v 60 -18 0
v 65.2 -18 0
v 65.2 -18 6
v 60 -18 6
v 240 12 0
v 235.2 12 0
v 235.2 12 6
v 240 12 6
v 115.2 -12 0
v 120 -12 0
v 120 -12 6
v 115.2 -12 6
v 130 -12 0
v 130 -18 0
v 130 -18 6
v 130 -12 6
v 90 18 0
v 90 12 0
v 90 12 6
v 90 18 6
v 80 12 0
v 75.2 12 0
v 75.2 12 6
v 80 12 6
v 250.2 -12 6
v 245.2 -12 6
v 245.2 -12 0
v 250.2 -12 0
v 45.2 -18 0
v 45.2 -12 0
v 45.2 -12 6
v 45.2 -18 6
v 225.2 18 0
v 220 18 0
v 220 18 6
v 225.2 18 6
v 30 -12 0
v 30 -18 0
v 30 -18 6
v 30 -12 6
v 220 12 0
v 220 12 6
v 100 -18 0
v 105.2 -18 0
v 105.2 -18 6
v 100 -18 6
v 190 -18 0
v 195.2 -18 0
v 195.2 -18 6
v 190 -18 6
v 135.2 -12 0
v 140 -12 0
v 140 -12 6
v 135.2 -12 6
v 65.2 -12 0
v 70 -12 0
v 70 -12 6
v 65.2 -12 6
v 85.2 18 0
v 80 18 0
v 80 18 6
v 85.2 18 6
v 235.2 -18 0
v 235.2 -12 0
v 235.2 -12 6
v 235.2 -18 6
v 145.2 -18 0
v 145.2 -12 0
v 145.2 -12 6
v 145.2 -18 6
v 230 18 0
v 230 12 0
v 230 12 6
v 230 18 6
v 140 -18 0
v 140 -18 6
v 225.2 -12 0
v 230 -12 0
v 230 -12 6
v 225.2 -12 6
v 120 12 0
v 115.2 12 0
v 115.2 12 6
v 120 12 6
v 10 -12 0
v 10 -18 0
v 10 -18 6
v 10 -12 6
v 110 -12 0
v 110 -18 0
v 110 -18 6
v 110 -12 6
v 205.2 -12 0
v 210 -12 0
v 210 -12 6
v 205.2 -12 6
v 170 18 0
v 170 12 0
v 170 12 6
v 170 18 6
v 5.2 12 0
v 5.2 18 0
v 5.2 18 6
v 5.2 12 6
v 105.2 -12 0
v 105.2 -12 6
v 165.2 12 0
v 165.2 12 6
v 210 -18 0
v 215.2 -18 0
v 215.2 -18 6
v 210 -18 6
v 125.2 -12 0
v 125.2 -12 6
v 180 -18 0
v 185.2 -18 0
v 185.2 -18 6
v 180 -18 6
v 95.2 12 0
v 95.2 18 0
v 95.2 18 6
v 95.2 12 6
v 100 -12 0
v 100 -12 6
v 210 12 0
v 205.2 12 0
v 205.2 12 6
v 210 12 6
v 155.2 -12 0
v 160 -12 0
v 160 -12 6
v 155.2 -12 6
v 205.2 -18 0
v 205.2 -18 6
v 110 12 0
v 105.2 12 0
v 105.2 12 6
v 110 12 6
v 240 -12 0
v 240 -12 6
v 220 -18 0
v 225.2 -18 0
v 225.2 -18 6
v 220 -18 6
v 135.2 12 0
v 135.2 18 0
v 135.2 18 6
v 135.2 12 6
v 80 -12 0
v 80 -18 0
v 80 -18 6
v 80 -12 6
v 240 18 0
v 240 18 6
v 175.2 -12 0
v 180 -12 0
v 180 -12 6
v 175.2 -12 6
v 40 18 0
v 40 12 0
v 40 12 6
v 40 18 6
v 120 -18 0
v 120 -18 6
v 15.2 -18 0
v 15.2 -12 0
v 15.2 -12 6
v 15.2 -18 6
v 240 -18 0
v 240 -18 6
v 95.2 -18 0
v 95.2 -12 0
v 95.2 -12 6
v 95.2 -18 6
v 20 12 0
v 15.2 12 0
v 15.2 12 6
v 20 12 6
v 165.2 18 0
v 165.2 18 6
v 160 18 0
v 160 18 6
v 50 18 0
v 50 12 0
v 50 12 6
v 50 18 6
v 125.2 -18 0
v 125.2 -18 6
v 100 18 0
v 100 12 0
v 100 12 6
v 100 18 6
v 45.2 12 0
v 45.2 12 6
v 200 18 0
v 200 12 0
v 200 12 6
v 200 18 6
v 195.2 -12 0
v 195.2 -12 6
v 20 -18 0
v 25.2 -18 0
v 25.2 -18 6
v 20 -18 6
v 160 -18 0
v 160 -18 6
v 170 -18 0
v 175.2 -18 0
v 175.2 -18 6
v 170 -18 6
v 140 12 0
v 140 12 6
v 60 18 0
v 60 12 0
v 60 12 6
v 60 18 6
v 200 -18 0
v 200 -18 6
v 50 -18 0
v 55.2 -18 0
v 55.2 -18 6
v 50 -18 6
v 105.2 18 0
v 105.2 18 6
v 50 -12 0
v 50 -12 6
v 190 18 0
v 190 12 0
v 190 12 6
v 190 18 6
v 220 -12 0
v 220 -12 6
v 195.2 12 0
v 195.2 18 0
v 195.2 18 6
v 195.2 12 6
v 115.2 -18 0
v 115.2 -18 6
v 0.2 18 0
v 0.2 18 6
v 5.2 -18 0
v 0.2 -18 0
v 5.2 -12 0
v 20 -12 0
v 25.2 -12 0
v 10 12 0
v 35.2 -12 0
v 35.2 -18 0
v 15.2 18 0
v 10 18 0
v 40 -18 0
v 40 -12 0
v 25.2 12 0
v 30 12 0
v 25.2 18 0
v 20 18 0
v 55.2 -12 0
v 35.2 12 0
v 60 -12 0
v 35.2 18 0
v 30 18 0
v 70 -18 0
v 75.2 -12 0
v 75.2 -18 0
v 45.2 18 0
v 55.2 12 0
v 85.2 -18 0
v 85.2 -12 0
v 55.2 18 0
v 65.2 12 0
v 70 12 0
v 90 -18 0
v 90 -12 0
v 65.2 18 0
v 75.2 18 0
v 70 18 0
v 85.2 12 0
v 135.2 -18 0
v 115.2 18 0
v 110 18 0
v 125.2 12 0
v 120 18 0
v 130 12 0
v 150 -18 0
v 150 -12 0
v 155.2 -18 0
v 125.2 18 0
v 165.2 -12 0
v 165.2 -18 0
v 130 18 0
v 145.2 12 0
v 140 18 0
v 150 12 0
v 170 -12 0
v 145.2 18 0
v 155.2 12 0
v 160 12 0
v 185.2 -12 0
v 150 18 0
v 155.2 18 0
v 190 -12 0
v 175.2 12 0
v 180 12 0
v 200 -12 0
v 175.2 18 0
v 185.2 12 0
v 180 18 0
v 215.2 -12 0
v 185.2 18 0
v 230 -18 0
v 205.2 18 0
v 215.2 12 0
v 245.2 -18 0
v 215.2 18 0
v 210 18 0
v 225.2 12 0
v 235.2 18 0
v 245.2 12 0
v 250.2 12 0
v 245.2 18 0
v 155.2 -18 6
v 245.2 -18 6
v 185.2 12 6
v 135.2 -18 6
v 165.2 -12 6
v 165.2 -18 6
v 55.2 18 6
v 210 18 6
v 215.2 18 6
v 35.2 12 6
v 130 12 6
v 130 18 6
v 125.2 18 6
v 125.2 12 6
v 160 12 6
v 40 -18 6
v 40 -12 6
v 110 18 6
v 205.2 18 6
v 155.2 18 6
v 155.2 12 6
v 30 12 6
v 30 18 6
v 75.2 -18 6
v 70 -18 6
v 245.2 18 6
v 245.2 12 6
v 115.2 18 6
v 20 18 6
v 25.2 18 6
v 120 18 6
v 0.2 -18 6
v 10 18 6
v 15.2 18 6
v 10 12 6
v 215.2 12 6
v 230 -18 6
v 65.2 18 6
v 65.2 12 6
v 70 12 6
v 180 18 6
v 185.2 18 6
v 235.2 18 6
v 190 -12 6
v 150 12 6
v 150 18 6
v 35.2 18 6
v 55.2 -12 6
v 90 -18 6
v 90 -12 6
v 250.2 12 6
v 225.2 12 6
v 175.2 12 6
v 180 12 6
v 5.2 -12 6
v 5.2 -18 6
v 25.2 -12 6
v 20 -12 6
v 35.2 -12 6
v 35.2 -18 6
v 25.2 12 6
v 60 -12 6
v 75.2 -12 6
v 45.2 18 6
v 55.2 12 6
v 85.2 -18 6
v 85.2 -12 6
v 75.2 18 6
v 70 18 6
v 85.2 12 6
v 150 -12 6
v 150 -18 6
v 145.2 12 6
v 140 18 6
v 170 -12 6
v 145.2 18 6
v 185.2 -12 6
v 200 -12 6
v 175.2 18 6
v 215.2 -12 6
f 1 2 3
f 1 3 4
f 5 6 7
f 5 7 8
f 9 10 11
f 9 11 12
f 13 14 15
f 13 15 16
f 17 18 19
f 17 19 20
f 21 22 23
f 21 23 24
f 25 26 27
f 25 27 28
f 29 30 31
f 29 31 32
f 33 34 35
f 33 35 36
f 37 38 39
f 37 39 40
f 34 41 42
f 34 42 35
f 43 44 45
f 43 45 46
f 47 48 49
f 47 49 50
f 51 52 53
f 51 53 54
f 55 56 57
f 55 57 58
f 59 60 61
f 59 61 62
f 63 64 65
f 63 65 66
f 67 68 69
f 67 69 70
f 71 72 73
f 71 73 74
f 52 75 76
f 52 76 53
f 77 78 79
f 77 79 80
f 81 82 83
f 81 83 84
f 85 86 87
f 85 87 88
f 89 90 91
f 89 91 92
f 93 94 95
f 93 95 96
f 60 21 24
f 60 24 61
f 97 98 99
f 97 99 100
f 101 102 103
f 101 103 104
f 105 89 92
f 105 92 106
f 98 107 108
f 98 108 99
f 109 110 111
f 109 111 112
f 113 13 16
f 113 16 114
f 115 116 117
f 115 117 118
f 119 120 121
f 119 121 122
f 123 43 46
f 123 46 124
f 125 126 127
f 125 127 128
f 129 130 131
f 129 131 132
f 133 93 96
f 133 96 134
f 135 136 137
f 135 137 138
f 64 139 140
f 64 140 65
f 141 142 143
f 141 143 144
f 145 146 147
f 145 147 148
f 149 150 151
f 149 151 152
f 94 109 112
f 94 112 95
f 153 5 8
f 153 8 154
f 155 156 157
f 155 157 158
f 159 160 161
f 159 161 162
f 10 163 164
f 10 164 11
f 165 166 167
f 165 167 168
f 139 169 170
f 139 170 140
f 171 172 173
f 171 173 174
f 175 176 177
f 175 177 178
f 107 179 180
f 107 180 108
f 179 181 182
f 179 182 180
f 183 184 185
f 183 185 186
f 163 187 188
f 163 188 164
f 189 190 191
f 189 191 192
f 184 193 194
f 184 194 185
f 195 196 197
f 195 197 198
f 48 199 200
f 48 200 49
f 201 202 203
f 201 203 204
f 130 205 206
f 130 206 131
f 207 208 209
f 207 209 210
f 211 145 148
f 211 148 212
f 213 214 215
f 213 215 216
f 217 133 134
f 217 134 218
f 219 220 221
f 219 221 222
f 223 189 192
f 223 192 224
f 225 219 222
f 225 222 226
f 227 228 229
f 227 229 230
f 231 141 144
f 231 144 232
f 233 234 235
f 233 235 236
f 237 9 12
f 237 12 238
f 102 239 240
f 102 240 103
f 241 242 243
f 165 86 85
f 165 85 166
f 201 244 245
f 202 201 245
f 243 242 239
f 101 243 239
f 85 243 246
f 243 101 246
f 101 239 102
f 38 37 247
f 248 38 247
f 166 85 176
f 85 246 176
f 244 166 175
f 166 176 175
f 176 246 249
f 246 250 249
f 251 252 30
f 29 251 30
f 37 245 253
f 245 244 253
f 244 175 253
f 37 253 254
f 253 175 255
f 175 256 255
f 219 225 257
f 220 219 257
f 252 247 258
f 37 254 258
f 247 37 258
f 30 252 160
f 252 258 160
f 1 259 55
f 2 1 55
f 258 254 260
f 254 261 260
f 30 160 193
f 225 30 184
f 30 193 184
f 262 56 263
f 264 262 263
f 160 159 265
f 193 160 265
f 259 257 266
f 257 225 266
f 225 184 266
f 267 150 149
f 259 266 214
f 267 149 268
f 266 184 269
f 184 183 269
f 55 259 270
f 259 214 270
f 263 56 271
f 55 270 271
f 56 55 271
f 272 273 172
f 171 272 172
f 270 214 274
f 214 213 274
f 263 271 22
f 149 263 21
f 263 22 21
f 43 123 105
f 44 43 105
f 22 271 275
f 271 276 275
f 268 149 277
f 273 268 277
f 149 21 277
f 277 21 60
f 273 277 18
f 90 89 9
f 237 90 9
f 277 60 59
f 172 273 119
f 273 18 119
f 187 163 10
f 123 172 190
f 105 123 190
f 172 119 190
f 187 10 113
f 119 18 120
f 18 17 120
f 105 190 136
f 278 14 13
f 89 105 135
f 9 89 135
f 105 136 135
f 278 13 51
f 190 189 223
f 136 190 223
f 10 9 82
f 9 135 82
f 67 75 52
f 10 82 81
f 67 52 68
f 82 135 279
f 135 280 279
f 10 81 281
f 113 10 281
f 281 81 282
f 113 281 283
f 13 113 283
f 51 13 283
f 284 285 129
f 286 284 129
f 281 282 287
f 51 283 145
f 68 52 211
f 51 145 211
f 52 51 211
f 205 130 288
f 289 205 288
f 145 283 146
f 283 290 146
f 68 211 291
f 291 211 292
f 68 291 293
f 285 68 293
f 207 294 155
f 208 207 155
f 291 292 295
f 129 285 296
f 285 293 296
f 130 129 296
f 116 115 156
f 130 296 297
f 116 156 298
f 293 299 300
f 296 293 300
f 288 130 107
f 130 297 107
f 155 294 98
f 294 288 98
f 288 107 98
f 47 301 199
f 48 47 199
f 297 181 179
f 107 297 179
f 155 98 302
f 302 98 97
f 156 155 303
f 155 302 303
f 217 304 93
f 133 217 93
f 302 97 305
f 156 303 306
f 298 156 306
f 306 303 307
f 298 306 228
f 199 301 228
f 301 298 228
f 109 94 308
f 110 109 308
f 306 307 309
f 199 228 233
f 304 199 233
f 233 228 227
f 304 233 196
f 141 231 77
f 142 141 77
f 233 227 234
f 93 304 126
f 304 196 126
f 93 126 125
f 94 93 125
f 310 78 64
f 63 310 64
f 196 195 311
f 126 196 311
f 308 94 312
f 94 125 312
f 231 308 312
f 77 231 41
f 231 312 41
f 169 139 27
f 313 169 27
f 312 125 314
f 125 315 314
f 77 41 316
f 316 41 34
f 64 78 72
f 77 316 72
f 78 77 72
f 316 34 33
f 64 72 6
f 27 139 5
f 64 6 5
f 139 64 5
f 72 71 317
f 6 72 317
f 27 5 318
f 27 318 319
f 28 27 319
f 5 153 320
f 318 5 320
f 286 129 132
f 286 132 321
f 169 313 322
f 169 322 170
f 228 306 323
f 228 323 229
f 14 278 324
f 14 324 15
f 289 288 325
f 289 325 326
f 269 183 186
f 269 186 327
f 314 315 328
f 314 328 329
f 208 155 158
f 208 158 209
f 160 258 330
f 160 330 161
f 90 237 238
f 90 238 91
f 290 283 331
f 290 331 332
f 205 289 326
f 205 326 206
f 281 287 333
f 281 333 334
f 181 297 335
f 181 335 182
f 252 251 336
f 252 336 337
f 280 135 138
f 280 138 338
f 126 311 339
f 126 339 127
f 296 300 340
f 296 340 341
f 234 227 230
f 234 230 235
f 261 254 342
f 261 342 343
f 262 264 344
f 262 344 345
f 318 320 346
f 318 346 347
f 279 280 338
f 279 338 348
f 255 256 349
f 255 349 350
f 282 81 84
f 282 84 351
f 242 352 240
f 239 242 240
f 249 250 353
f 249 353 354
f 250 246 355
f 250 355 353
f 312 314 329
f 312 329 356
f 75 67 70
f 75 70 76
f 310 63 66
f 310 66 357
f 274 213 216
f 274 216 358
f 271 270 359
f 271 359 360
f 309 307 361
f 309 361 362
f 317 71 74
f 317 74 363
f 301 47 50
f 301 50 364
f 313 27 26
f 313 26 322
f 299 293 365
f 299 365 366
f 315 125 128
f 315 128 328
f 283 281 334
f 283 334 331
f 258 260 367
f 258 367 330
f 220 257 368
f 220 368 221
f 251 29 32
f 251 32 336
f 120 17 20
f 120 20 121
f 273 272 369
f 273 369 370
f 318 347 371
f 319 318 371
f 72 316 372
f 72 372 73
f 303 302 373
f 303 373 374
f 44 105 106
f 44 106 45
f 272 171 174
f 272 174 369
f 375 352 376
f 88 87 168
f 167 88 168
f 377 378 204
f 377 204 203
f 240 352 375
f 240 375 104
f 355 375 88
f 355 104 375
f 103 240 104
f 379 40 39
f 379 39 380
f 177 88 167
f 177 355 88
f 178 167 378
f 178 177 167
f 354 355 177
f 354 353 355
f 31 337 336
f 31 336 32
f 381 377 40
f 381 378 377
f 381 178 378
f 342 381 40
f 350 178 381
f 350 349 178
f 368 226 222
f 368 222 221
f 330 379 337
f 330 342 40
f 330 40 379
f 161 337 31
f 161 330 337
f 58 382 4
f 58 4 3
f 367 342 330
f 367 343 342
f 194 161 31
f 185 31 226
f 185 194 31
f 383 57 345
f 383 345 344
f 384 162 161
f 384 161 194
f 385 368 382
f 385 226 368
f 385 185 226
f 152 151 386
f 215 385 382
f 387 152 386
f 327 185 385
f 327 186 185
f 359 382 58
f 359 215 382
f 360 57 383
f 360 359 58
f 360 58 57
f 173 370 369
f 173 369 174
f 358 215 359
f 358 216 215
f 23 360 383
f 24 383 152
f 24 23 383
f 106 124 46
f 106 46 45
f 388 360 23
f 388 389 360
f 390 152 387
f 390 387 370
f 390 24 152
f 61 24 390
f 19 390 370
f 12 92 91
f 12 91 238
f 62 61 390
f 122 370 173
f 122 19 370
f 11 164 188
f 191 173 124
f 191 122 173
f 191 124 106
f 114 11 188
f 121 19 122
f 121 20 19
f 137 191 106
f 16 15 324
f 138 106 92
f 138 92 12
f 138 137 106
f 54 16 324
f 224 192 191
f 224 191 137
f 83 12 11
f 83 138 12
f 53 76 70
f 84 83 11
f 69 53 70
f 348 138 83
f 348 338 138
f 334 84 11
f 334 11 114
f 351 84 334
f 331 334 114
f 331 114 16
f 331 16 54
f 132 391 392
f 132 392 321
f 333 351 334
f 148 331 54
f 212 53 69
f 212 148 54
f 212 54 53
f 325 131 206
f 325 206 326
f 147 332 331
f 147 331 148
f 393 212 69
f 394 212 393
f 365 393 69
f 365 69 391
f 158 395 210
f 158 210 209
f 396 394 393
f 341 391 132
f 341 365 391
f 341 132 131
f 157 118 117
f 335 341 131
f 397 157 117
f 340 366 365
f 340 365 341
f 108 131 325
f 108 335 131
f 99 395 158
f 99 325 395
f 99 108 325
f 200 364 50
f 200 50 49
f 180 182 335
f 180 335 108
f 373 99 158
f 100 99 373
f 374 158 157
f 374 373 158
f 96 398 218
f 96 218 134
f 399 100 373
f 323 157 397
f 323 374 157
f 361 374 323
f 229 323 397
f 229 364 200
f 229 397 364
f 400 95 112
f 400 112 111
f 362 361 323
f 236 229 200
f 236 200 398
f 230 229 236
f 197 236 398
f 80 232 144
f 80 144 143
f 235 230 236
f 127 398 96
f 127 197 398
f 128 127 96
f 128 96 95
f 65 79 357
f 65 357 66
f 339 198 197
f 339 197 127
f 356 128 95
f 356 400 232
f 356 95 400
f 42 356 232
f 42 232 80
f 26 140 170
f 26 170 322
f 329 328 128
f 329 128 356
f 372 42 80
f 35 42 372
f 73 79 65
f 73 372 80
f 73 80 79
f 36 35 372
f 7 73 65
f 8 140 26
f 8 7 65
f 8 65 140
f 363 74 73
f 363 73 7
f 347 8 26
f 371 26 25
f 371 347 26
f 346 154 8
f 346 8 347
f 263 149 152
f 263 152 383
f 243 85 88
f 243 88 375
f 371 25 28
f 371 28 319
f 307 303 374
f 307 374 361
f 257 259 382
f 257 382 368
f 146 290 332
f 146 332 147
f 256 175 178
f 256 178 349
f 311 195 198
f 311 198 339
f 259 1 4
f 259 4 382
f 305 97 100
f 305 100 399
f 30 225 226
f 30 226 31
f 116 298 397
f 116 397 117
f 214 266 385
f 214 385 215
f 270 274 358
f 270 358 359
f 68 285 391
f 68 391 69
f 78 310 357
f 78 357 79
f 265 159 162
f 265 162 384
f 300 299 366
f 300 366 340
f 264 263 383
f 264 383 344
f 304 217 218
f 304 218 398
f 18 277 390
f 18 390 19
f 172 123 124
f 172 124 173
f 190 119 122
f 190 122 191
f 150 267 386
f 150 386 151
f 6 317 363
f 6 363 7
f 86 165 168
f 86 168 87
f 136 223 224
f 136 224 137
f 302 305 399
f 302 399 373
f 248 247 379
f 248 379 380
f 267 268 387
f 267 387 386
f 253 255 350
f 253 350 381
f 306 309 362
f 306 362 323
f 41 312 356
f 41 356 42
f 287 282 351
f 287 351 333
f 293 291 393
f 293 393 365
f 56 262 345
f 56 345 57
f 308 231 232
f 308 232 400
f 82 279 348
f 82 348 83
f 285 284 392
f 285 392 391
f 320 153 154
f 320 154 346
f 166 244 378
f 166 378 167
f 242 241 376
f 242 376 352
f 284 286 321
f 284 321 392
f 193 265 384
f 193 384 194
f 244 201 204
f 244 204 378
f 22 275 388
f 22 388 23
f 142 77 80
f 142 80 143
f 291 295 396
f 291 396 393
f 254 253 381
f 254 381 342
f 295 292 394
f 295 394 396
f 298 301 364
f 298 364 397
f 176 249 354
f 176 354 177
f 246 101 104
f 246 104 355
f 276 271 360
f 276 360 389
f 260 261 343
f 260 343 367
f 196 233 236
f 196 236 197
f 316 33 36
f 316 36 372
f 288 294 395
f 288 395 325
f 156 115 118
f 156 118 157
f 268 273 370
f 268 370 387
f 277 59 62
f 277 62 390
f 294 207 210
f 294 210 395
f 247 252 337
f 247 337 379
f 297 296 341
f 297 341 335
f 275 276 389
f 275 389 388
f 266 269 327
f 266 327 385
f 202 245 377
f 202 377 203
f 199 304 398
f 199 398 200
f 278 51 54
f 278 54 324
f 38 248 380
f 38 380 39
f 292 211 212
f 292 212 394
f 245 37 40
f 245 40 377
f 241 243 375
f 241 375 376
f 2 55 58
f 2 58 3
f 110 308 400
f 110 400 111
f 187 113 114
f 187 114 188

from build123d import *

# Parameters (mm, degrees)
BOSS_EXTRU_1_DEPTH      = 6
ESQUISSE2_W             = 0.2
ESQUISSE2_H             = 36
ENL_V_MAT_EXTRU_1_DEPTH = 10
ESQUISSE3_W             = 0.2
ESQUISSE3_H             = 24
BOSS_EXTRU_2_DEPTH      = 6


with BuildPart() as part:
    # Esquisse1 → Boss.-Extru.1 (new body)
    with BuildSketch(Plane.XY):
        Polygon((0, -18), (0, 18), (5.2, 18), (5.2, 12), (10, 12), (10, 18), (15.2, 18), (15.2, 12), (20, 12), (20, 18), (25.2, 18), (25.2, 12), (30, 12), (30, 18), (35.2, 18), (35.2, 12), (40, 12), (40, 18), (45.2, 18), (45.2, 12), (50, 12), (50, 18), (55.2, 18), (55.2, 12), (60, 12), (60, 18), (65.2, 18), (65.2, 12), (70, 12), (70, 18), (75.2, 18), (75.2, 12), (80, 12), (80, 18), (85.2, 18), (85.2, 12), (90, 12), (90, 18), (95.2, 18), (95.2, 12), (100, 12), (100, 18), (105.2, 18), (105.2, 12), (110, 12), (110, 18), (115.2, 18), (115.2, 12), (120, 12), (120, 18), (125.2, 18), (125.2, 12), (130, 12), (130, 18), (135.2, 18), (135.2, 12), (140, 12), (140, 18), (145.2, 18), (145.2, 12), (150, 12), (150, 18), (155.2, 18), (155.2, 12), (160, 12), (160, 18), (165.2, 18), (165.2, 12), (170, 12), (170, 18), (175.2, 18), (175.2, 12), (180, 12), (180, 18), (185.2, 18), (185.2, 12), (190, 12), (190, 18), (195.2, 18), (195.2, 12), (200, 12), (200, 18), (205.2, 18), (205.2, 12), (210, 12), (210, 18), (215.2, 18), (215.2, 12), (220, 12), (220, 18), (225.2, 18), (225.2, 12), (230, 12), (230, 18), (235.2, 18), (235.2, 12), (240, 12), (240, 18), (245.2, 18), (245.2, 12), (250, 12), (250, -12), (245.2, -12), (245.2, -18), (240, -18), (240, -12), (235.2, -12), (235.2, -18), (230, -18), (230, -12), (225.2, -12), (225.2, -18), (220, -18), (220, -12), (215.2, -12), (215.2, -18), (210, -18), (210, -12), (205.2, -12), (205.2, -18), (200, -18), (200, -12), (195.2, -12), (195.2, -18), (190, -18), (190, -12), (185.2, -12), (185.2, -18), (180, -18), (180, -12), (175.2, -12), (175.2, -18), (170, -18), (170, -12), (165.2, -12), (165.2, -18), (160, -18), (160, -12), (155.2, -12), (155.2, -18), (150, -18), (150, -12), (145.2, -12), (145.2, -18), (140, -18), (140, -12), (135.2, -12), (135.2, -18), (130, -18), (130, -12), (125.2, -12), (125.2, -18), (120, -18), (120, -12), (115.2, -12), (115.2, -18), (110, -18), (110, -12), (105.2, -12), (105.2, -18), (100, -18), (100, -12), (95.2, -12), (95.2, -18), (90, -18), (90, -12), (85.2, -12), (85.2, -18), (80, -18), (80, -12), (75.2, -12), (75.2, -18), (70, -18), (70, -12), (65.2, -12), (65.2, -18), (60, -18), (60, -12), (55.2, -12), (55.2, -18), (50, -18), (50, -12), (45.2, -12), (45.2, -18), (40, -18), (40, -12), (35.2, -12), (35.2, -18), (30, -18), (30, -12), (25.2, -12), (25.2, -18), (20, -18), (20, -12), (15.2, -12), (15.2, -18), (10, -18), (10, -12), (5.2, -12), (5.2, -18), align=None)
    extrude(amount=BOSS_EXTRU_1_DEPTH)

    # Esquisse2 → Enlèv. mat.-Extru.1 (cut)
    with BuildSketch(Plane.XY.offset(6)):
        with Locations((0.1, 0)):
            Rectangle(ESQUISSE2_W, ESQUISSE2_H)
    extrude(amount=-ENL_V_MAT_EXTRU_1_DEPTH, mode=Mode.SUBTRACT)

    # Esquisse3 → Boss.-Extru.2 (add)
    with BuildSketch(Plane.XY.offset(6)):
        with Locations((250.1, 0)):
            Rectangle(ESQUISSE3_W, ESQUISSE3_H)
    extrude(amount=-BOSS_EXTRU_2_DEPTH)


solid = part.part
